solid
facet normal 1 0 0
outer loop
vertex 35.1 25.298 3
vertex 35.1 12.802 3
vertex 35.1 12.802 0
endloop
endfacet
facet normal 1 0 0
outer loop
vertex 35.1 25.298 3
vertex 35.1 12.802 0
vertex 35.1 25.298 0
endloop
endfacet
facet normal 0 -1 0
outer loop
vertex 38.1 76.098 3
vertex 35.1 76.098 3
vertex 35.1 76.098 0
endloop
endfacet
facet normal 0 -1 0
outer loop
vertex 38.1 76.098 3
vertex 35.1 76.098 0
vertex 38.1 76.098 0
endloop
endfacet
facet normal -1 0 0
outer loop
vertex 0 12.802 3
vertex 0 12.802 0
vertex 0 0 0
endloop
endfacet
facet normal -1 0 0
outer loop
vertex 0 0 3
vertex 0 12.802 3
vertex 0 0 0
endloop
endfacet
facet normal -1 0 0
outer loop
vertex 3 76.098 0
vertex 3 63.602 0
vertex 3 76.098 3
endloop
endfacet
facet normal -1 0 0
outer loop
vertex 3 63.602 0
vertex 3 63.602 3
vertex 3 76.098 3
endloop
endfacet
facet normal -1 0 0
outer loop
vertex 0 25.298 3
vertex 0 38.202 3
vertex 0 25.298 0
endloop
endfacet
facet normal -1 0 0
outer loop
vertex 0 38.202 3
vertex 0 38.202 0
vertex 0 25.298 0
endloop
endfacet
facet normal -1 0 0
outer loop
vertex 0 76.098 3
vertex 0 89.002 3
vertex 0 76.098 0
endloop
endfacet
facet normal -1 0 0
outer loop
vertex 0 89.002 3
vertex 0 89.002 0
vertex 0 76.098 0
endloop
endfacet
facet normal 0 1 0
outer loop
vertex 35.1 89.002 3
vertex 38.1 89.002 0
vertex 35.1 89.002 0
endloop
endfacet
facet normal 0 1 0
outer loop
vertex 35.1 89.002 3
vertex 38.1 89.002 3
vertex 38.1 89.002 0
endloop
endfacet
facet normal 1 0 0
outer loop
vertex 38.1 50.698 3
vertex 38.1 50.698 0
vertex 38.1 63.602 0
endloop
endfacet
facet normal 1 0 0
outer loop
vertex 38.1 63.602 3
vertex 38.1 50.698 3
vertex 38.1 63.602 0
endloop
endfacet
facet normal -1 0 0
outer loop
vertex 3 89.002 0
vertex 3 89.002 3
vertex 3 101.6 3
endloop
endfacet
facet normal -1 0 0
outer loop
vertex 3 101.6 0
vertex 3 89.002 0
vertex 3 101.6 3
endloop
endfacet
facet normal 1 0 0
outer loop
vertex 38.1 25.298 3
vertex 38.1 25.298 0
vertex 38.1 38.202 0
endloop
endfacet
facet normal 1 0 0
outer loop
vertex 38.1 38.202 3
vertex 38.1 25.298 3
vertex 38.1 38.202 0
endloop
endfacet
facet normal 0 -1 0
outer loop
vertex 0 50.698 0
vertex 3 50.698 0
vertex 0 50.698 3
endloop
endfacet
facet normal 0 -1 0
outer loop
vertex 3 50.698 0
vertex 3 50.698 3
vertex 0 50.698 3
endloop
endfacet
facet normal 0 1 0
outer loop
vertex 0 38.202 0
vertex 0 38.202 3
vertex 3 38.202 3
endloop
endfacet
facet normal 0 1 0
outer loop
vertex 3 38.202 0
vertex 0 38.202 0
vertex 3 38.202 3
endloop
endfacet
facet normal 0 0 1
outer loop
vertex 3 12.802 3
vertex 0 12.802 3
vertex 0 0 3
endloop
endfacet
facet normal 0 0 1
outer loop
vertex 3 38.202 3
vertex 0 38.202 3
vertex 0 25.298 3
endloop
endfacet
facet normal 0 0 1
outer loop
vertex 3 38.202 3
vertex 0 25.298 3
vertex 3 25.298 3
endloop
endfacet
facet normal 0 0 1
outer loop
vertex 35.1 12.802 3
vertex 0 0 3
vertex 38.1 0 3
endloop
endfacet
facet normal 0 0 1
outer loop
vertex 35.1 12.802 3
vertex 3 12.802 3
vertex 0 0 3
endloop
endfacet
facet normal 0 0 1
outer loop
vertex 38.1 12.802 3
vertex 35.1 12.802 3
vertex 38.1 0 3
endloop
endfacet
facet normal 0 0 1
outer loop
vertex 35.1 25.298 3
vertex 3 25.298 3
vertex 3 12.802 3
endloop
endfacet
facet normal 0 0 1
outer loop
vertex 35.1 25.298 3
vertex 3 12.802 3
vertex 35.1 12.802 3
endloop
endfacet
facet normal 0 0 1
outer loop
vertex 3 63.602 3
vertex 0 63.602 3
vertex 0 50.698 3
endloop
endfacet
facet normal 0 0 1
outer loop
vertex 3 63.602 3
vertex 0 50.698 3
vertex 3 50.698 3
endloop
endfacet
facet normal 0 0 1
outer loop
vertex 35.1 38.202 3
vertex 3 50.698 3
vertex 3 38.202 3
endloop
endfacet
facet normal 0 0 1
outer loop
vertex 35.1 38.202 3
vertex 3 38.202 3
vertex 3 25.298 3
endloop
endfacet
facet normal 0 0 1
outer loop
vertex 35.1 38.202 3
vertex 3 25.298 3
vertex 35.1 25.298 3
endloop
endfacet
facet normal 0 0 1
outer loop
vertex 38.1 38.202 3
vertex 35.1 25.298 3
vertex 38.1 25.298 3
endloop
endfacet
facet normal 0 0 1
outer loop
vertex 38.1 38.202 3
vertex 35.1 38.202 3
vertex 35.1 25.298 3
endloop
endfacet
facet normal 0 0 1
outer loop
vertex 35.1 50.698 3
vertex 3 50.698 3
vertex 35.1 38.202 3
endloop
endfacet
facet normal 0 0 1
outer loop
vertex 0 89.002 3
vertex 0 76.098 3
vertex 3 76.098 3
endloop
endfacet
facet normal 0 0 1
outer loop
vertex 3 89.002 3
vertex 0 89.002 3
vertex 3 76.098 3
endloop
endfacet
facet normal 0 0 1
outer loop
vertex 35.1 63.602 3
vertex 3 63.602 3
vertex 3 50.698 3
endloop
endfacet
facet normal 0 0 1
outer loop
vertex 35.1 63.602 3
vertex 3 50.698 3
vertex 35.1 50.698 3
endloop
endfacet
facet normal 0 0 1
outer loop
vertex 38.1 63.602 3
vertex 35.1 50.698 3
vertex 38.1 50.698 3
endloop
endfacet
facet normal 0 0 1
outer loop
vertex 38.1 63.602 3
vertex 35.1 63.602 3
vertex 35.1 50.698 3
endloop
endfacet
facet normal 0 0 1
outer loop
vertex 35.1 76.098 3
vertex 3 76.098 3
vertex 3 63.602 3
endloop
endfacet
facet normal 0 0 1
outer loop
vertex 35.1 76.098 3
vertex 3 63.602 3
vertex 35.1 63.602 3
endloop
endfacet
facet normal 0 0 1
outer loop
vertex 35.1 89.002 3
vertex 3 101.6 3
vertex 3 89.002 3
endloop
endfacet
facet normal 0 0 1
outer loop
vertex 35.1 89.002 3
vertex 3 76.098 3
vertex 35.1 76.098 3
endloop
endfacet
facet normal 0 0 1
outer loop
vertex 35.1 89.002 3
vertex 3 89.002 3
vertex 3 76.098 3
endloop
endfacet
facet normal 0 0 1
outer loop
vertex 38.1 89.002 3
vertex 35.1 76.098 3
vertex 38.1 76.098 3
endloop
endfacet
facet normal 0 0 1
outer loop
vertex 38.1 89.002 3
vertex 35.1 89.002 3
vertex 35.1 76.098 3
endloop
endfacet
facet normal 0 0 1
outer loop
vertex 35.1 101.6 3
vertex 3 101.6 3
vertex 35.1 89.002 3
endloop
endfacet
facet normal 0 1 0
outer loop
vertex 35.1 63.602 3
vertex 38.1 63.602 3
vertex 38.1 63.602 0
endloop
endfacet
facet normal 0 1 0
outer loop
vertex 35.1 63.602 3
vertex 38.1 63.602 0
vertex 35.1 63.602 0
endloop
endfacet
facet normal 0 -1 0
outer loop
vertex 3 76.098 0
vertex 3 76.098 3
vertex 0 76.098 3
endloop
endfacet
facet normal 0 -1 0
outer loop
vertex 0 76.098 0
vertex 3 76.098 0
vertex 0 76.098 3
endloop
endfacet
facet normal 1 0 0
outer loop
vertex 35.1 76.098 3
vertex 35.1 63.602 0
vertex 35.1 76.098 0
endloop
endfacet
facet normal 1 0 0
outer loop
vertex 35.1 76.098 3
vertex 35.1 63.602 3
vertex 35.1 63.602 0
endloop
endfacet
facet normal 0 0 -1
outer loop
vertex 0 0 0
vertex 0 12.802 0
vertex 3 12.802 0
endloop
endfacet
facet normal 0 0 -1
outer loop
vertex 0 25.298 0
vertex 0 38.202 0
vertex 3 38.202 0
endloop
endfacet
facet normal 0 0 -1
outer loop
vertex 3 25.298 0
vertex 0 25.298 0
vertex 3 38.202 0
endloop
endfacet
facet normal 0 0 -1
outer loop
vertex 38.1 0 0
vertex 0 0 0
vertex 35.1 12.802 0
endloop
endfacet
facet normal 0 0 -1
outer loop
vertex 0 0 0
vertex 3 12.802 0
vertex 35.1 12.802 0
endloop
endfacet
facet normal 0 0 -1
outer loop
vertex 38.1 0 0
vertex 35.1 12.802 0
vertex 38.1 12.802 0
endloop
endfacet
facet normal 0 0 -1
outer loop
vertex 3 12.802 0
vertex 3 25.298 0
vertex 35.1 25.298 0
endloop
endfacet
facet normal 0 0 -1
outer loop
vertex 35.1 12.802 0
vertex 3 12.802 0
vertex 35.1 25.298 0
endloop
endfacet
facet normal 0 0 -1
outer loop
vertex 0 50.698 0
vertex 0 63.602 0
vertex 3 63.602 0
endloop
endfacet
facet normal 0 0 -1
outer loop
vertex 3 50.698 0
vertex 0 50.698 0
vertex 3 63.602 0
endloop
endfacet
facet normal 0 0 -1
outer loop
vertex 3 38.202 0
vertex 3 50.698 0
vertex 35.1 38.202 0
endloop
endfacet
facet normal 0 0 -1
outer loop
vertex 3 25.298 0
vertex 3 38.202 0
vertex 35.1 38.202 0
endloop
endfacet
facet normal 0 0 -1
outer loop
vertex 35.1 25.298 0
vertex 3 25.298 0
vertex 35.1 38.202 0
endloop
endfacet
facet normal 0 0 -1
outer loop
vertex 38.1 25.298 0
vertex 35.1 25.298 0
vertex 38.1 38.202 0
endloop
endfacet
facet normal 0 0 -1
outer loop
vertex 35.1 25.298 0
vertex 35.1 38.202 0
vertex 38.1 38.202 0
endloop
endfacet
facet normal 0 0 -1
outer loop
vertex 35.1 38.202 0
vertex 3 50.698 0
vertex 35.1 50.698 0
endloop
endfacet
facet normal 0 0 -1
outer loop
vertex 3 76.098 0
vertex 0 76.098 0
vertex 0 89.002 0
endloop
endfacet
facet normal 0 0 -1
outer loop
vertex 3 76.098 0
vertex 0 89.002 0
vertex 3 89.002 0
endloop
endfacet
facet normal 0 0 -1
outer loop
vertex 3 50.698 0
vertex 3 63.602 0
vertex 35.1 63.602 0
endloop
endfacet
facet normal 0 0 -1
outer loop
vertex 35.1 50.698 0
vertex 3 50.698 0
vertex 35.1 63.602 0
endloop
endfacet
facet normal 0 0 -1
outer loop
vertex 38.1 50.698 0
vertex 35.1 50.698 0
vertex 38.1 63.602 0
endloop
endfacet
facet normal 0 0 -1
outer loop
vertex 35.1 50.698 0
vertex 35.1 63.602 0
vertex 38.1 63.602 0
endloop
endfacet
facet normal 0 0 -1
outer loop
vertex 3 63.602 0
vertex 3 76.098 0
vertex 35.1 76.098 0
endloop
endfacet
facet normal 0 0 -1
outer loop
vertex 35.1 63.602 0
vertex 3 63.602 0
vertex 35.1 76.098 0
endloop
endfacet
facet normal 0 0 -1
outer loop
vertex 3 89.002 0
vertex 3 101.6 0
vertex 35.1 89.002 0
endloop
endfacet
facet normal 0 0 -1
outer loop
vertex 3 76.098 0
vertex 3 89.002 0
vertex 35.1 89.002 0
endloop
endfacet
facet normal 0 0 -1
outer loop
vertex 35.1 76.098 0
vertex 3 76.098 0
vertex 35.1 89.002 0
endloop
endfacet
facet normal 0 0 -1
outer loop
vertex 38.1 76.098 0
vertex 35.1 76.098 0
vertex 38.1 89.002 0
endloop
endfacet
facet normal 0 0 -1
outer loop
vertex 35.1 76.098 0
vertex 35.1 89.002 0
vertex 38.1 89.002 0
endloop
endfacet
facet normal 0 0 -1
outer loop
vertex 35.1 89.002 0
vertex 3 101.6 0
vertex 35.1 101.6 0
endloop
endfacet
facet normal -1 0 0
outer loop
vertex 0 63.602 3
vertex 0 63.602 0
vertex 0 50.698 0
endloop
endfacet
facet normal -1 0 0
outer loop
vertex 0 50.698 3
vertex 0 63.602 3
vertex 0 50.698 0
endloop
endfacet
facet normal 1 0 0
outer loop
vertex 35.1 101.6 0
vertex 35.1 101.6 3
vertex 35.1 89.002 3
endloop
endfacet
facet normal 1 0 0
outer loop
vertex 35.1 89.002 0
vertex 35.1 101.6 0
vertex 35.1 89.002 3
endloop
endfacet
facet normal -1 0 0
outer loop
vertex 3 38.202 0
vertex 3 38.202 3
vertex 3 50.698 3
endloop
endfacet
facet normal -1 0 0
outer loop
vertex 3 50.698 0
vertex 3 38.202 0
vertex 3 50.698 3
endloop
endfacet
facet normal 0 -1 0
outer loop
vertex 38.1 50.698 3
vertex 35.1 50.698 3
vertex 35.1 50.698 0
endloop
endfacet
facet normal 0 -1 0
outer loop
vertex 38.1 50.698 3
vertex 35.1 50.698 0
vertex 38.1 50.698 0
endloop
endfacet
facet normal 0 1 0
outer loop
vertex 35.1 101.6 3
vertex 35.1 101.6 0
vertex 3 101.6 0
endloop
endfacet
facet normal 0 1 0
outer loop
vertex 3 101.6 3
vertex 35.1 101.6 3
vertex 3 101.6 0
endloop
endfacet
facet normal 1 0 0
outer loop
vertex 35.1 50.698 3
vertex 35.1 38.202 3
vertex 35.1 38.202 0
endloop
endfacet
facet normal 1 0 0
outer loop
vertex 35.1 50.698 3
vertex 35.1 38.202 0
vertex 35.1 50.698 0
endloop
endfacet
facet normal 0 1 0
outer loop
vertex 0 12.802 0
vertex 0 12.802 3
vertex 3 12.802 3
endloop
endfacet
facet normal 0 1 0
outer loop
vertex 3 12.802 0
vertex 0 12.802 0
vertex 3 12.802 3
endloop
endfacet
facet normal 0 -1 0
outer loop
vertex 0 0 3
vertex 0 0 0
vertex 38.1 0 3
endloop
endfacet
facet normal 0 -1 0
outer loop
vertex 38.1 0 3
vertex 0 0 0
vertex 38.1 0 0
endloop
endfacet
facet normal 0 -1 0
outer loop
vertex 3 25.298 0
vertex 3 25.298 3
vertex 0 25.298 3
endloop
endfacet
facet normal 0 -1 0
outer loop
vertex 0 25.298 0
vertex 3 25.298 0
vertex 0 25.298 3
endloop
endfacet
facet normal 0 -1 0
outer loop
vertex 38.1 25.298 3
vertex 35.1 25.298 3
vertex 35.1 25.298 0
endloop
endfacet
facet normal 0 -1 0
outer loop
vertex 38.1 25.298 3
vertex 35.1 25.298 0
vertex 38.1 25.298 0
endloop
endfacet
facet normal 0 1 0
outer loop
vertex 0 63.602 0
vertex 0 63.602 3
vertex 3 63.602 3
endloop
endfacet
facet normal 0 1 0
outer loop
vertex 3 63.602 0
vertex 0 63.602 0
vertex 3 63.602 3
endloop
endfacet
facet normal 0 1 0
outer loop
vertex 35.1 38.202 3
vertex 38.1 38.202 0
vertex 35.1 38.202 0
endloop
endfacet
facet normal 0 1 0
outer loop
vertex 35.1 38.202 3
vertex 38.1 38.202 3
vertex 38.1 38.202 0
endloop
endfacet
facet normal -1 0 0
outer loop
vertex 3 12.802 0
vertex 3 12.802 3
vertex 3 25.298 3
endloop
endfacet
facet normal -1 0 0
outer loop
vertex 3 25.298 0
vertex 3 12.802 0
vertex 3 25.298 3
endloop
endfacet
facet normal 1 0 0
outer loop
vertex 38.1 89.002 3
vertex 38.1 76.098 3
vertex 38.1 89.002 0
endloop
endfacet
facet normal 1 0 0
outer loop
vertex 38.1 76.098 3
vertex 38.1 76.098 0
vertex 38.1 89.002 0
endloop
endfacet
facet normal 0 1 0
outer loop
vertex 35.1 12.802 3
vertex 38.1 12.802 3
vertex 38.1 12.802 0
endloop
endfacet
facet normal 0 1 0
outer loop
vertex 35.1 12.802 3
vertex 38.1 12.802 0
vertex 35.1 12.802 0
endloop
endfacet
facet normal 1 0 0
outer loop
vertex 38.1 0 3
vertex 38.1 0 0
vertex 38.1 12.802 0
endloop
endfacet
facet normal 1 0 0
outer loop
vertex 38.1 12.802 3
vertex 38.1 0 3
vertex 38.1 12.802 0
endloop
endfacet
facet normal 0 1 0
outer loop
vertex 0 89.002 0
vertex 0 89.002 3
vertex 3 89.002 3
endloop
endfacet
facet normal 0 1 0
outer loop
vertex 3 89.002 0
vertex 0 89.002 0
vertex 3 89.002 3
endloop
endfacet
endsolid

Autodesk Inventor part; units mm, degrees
ref_plane "YZ Plane" through (0, 0, 0) normal (1, 0, 0) x (0, 1, 0)
ref_plane "XZ Plane" through (0, 0, 0) normal (0, 1, 0) x (-1, 0, 0)
ref_plane "XY Plane" through (0, 0, 0) normal (0, 0, 1) x (1, 0, 0)
sketch "Sketch1" plane through (0, 0, 0) normal (0, 0, 1) x (1, 0, 0)
  line L0 (0, 0) -> (38.1, 0)
  line L1 (38.1, 0) -> (38.1, 101.6)
  line L2 (38.1, 101.6) -> (0, 101.6)
  line L3 (0, 101.6) -> (0, 0)
  dimension "d0" = 38.1
  dimension "d1" = 101.6
extrude "Extrusion1" add sketch "Sketch1" along normal blind 3
sketch "Sketch2" plane through (0, 0, 3) normal (0, 0, 1) x (1, 0, 0)
  line L0 (0, 0) -> (38.1, 0) projected
  line L1 (38.1, 0) -> (38.1, 101.6) projected
  line L2 (38.1, 101.6) -> (0, 101.6) projected
  line L3 (0, 101.6) -> (0, 0) projected
  line L4 (38.1, 12.8016) -> (35.1, 12.8016)
  line L5 (35.1, 12.8016) -> (35.1, 25.2984)
  line L6 (35.1, 25.2984) -> (38.1, 25.2984)
  line L7 (38.1, 25.2984) -> (38.1, 12.8016)
  line L8 (35.1, 38.2016) -> (35.1, 50.6984)
  line L9 (35.1, 50.6984) -> (38.1, 50.6984)
  line L10 (38.1, 38.2016) -> (35.1, 38.2016)
  line L11 (38.1, 50.6984) -> (38.1, 38.2016)
  line L12 (35.1, 63.6016) -> (35.1, 76.0984)
  line L13 (35.1, 76.0984) -> (38.1, 76.0984)
  line L14 (38.1, 63.6016) -> (35.1, 63.6016)
  line L15 (38.1, 76.0984) -> (38.1, 63.6016)
  line L16 (35.1, 89.0016) -> (35.1, 101.4984)
  line L17 (35.1, 101.4984) -> (38.1, 101.4984)
  line L18 (38.1, 89.0016) -> (35.1, 89.0016)
  line L19 (38.1, 101.4984) -> (38.1, 89.0016)
  line L20 (0, 0) -> (38.1, 0) construction
  line L21 (19.05, 0) -> (19.05, 101.6) construction
  line L22 (0, 12.8016) -> (3, 12.8016)
  line L23 (3, 12.8016) -> (3, 25.2984)
  line L24 (3, 25.2984) -> (0, 25.2984)
  line L25 (3, 38.2016) -> (3, 50.6984)
  line L26 (3, 50.6984) -> (0, 50.6984)
  line L27 (0, 38.2016) -> (3, 38.2016)
  line L28 (3, 63.6016) -> (3, 76.0984)
  line L29 (3, 76.0984) -> (0, 76.0984)
  line L30 (0, 63.6016) -> (3, 63.6016)
  line L31 (0, 76.0984) -> (0, 63.6016)
  line L32 (3, 89.0016) -> (3, 101.4984)
  line L33 (3, 101.4984) -> (0, 101.4984)
  line L34 (0, 89.0016) -> (3, 89.0016)
  line L35 (0, 101.4984) -> (0, 89.0016)
  line L36 (0, 38.2016) -> (0, 50.6984)
  line L37 (0, 101.6) -> (0, 0) projected
  line L38 (0, 12.8016) -> (0, 25.2984)
  dimension "d4" = 12.4968
  dimension "d5" = 12.8016
  dimension "d6" = 3
  dimension "d9" = 25.4
extrude "Extrusion2" cut sketch "Sketch2" against normal blind 3 contours L3 L24 L23 L22 | L4 L5 L6 L1 | L3 L26 L25 L27 | L10 L8 L9 L1 | L3 L29 L28 L30 | L14 L12 L13 L1 | L3 L33 L32 L34 | L18 L16 L17 L1
sketch "Sketch3" plane through (0, 0, 3) normal (0, 0, 1) x (1, 0, 0)
  line L0 (35.1, 76.0984) -> (38.1, 76.0984) projected
  line L1 (38.1, 76.0984) -> (38.1, 89.0016) projected
  line L2 (38.1, 89.0016) -> (35.1, 89.0016) projected
  line L3 (35.1, 89.0016) -> (35.1, 101.4984) projected
  line L4 (35.1, 101.4984) -> (38.1, 101.4984) projected
  line L5 (38.1, 101.4984) -> (38.1, 101.6) projected
  line L6 (38.1, 101.6) -> (0, 101.6) projected
  line L7 (0, 101.6) -> (0, 101.4984) projected
  line L8 (0, 0) -> (38.1, 0) projected
  line L9 (38.1, 0) -> (38.1, 12.8016) projected
  line L10 (38.1, 12.8016) -> (35.1, 12.8016) projected
  line L11 (35.1, 12.8016) -> (35.1, 25.2984) projected
  line L12 (35.1, 25.2984) -> (38.1, 25.2984) projected
  line L13 (38.1, 25.2984) -> (38.1, 38.2016) projected
  line L14 (38.1, 38.2016) -> (35.1, 38.2016) projected
  line L15 (35.1, 38.2016) -> (35.1, 50.6984) projected
  line L16 (35.1, 50.6984) -> (38.1, 50.6984) projected
  line L17 (38.1, 50.6984) -> (38.1, 63.6016) projected
  line L18 (38.1, 63.6016) -> (35.1, 63.6016) projected
  line L19 (35.1, 63.6016) -> (35.1, 76.0984) projected
  line L20 (38.1, 101.4984) -> (35.1, 101.4984) projected
  line L21 (38.1, 101.6) -> (35.1, 101.6)
  line L22 (35.1, 101.6) -> (35.1, 101.4984)
  line L23 (35.1, 101.4984) -> (38.1, 101.4984)
  line L24 (38.1, 101.4984) -> (38.1, 101.6)
  line L25 (3, 38.2016) -> (0, 38.2016) projected
  line L26 (0, 38.2016) -> (0, 25.2984) projected
  line L27 (0, 25.2984) -> (3, 25.2984) projected
  line L28 (3, 25.2984) -> (3, 12.8016) projected
  line L29 (3, 12.8016) -> (0, 12.8016) projected
  line L30 (0, 12.8016) -> (0, 0) projected
  line L31 (0, 101.4984) -> (3, 101.4984) projected
  line L32 (3, 101.4984) -> (3, 89.0016) projected
  line L33 (3, 89.0016) -> (0, 89.0016) projected
  line L34 (0, 89.0016) -> (0, 76.0984) projected
  line L35 (0, 76.0984) -> (3, 76.0984) projected
  line L36 (3, 76.0984) -> (3, 63.6016) projected
  line L37 (3, 63.6016) -> (0, 63.6016) projected
  line L38 (0, 63.6016) -> (0, 50.6984) projected
  line L39 (0, 50.6984) -> (3, 50.6984) projected
  line L40 (3, 50.6984) -> (3, 38.2016) projected
  line L41 (3, 101.4984) -> (0, 101.4984) projected
  line L42 (0, 101.6) -> (3, 101.6)
  line L43 (3, 101.6) -> (3, 101.4984)
  line L44 (3, 101.4984) -> (0, 101.4984)
  line L45 (0, 101.4984) -> (0, 101.6)
extrude "Extrusion3" cut sketch "Sketch3" against normal blind 3 contours L22 L6 L5 L4 | L43 L31 L7 L6
properties part number "WallBend"
